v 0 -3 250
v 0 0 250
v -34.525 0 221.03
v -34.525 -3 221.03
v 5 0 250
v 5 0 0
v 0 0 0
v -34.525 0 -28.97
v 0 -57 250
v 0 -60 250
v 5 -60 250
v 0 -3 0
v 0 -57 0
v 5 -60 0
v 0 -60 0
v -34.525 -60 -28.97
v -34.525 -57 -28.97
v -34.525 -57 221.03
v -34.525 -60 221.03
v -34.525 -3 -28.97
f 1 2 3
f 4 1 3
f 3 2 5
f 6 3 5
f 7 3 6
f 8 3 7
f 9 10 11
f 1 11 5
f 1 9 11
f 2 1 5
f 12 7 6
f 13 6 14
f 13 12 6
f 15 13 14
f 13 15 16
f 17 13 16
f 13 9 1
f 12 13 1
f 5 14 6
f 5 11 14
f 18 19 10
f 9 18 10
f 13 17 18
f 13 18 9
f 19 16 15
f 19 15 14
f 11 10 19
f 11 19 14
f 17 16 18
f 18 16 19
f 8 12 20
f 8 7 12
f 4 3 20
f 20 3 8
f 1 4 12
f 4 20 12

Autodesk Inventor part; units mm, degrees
ref_plane "YZ Plane" through (0, 0, 0) normal (1, 0, 0) x (0, 1, 0)
ref_plane "XZ Plane" through (0, 0, 0) normal (0, 1, 0) x (-1, 0, 0)
ref_plane "XY Plane" through (0, 0, 0) normal (0, 0, 1) x (1, 0, 0)
sketch "Sketch1" plane through (0, 0, 0) normal (1, 0, 0) x (0, 1, 0)
  line L0 (0, 0) -> (-60, 0)
  line L1 (-60, 0) -> (-60, 250)
  line L2 (-60, 250) -> (0, 250)
  line L3 (0, 250) -> (0, 0)
  dimension "d0" = 60
  dimension "d1" = 250
extrude "Extrusion1" add sketch "Sketch1" along normal blind 5
sketch "Sketch2" plane through (5, 0, 0) normal (1, 0, 0) x (0, 0, -1)
  point P0 (0, 0)
sketch "Sketch3" plane through (0, 0, 250) normal (0, 1, 0) x (1, 0, 0)
  line L0 (-34.5249, 250) -> (-35, 250)
  line L1 (0, 250) -> (-34.5249, 278.9698)
  line L2 (0, 250) -> (45.069, 250) construction
  line L3 (-34.5249, 0) -> (-35, 0)
  line L4 (0, 0) -> (-34.5249, 28.9698)
  line L5 (0, 0) -> (45.069, 0) construction
  line L6 (-34.5249, 28.9698) -> (-34.5249, 278.9698)
  line L7 (0, 0) -> (0, 250)
  dimension "d4" = 35
  dimension "d5" = 45.069
  dimension "d6" = 140
  dimension "d7" = 35
  dimension "d8" = 45.069
  dimension "d9" = 140
sketch "Sketch4" plane through (0, 0, 250) normal (0, 1, 0) x (1, 0, 0)
  line L0 (0, 0) -> (0, 250)
extrude "Extrusion2" add sketch "Sketch3" against normal blind 3
sketch "Sketch5" plane through (0, -60, 0) normal (0, -1, 0) x (1, 0, 0)
  line L0 (0, 0) -> (-34.5249, -28.9698)
  line L1 (-34.5249, -28.9698) -> (-34.5249, 221.0302)
  line L2 (-34.5249, 221.0302) -> (0, 250)
  line L3 (0, 250) -> (0, 0)
extrude "Extrusion3" add sketch "Sketch5" against normal blind 3
properties part number "elevation"
